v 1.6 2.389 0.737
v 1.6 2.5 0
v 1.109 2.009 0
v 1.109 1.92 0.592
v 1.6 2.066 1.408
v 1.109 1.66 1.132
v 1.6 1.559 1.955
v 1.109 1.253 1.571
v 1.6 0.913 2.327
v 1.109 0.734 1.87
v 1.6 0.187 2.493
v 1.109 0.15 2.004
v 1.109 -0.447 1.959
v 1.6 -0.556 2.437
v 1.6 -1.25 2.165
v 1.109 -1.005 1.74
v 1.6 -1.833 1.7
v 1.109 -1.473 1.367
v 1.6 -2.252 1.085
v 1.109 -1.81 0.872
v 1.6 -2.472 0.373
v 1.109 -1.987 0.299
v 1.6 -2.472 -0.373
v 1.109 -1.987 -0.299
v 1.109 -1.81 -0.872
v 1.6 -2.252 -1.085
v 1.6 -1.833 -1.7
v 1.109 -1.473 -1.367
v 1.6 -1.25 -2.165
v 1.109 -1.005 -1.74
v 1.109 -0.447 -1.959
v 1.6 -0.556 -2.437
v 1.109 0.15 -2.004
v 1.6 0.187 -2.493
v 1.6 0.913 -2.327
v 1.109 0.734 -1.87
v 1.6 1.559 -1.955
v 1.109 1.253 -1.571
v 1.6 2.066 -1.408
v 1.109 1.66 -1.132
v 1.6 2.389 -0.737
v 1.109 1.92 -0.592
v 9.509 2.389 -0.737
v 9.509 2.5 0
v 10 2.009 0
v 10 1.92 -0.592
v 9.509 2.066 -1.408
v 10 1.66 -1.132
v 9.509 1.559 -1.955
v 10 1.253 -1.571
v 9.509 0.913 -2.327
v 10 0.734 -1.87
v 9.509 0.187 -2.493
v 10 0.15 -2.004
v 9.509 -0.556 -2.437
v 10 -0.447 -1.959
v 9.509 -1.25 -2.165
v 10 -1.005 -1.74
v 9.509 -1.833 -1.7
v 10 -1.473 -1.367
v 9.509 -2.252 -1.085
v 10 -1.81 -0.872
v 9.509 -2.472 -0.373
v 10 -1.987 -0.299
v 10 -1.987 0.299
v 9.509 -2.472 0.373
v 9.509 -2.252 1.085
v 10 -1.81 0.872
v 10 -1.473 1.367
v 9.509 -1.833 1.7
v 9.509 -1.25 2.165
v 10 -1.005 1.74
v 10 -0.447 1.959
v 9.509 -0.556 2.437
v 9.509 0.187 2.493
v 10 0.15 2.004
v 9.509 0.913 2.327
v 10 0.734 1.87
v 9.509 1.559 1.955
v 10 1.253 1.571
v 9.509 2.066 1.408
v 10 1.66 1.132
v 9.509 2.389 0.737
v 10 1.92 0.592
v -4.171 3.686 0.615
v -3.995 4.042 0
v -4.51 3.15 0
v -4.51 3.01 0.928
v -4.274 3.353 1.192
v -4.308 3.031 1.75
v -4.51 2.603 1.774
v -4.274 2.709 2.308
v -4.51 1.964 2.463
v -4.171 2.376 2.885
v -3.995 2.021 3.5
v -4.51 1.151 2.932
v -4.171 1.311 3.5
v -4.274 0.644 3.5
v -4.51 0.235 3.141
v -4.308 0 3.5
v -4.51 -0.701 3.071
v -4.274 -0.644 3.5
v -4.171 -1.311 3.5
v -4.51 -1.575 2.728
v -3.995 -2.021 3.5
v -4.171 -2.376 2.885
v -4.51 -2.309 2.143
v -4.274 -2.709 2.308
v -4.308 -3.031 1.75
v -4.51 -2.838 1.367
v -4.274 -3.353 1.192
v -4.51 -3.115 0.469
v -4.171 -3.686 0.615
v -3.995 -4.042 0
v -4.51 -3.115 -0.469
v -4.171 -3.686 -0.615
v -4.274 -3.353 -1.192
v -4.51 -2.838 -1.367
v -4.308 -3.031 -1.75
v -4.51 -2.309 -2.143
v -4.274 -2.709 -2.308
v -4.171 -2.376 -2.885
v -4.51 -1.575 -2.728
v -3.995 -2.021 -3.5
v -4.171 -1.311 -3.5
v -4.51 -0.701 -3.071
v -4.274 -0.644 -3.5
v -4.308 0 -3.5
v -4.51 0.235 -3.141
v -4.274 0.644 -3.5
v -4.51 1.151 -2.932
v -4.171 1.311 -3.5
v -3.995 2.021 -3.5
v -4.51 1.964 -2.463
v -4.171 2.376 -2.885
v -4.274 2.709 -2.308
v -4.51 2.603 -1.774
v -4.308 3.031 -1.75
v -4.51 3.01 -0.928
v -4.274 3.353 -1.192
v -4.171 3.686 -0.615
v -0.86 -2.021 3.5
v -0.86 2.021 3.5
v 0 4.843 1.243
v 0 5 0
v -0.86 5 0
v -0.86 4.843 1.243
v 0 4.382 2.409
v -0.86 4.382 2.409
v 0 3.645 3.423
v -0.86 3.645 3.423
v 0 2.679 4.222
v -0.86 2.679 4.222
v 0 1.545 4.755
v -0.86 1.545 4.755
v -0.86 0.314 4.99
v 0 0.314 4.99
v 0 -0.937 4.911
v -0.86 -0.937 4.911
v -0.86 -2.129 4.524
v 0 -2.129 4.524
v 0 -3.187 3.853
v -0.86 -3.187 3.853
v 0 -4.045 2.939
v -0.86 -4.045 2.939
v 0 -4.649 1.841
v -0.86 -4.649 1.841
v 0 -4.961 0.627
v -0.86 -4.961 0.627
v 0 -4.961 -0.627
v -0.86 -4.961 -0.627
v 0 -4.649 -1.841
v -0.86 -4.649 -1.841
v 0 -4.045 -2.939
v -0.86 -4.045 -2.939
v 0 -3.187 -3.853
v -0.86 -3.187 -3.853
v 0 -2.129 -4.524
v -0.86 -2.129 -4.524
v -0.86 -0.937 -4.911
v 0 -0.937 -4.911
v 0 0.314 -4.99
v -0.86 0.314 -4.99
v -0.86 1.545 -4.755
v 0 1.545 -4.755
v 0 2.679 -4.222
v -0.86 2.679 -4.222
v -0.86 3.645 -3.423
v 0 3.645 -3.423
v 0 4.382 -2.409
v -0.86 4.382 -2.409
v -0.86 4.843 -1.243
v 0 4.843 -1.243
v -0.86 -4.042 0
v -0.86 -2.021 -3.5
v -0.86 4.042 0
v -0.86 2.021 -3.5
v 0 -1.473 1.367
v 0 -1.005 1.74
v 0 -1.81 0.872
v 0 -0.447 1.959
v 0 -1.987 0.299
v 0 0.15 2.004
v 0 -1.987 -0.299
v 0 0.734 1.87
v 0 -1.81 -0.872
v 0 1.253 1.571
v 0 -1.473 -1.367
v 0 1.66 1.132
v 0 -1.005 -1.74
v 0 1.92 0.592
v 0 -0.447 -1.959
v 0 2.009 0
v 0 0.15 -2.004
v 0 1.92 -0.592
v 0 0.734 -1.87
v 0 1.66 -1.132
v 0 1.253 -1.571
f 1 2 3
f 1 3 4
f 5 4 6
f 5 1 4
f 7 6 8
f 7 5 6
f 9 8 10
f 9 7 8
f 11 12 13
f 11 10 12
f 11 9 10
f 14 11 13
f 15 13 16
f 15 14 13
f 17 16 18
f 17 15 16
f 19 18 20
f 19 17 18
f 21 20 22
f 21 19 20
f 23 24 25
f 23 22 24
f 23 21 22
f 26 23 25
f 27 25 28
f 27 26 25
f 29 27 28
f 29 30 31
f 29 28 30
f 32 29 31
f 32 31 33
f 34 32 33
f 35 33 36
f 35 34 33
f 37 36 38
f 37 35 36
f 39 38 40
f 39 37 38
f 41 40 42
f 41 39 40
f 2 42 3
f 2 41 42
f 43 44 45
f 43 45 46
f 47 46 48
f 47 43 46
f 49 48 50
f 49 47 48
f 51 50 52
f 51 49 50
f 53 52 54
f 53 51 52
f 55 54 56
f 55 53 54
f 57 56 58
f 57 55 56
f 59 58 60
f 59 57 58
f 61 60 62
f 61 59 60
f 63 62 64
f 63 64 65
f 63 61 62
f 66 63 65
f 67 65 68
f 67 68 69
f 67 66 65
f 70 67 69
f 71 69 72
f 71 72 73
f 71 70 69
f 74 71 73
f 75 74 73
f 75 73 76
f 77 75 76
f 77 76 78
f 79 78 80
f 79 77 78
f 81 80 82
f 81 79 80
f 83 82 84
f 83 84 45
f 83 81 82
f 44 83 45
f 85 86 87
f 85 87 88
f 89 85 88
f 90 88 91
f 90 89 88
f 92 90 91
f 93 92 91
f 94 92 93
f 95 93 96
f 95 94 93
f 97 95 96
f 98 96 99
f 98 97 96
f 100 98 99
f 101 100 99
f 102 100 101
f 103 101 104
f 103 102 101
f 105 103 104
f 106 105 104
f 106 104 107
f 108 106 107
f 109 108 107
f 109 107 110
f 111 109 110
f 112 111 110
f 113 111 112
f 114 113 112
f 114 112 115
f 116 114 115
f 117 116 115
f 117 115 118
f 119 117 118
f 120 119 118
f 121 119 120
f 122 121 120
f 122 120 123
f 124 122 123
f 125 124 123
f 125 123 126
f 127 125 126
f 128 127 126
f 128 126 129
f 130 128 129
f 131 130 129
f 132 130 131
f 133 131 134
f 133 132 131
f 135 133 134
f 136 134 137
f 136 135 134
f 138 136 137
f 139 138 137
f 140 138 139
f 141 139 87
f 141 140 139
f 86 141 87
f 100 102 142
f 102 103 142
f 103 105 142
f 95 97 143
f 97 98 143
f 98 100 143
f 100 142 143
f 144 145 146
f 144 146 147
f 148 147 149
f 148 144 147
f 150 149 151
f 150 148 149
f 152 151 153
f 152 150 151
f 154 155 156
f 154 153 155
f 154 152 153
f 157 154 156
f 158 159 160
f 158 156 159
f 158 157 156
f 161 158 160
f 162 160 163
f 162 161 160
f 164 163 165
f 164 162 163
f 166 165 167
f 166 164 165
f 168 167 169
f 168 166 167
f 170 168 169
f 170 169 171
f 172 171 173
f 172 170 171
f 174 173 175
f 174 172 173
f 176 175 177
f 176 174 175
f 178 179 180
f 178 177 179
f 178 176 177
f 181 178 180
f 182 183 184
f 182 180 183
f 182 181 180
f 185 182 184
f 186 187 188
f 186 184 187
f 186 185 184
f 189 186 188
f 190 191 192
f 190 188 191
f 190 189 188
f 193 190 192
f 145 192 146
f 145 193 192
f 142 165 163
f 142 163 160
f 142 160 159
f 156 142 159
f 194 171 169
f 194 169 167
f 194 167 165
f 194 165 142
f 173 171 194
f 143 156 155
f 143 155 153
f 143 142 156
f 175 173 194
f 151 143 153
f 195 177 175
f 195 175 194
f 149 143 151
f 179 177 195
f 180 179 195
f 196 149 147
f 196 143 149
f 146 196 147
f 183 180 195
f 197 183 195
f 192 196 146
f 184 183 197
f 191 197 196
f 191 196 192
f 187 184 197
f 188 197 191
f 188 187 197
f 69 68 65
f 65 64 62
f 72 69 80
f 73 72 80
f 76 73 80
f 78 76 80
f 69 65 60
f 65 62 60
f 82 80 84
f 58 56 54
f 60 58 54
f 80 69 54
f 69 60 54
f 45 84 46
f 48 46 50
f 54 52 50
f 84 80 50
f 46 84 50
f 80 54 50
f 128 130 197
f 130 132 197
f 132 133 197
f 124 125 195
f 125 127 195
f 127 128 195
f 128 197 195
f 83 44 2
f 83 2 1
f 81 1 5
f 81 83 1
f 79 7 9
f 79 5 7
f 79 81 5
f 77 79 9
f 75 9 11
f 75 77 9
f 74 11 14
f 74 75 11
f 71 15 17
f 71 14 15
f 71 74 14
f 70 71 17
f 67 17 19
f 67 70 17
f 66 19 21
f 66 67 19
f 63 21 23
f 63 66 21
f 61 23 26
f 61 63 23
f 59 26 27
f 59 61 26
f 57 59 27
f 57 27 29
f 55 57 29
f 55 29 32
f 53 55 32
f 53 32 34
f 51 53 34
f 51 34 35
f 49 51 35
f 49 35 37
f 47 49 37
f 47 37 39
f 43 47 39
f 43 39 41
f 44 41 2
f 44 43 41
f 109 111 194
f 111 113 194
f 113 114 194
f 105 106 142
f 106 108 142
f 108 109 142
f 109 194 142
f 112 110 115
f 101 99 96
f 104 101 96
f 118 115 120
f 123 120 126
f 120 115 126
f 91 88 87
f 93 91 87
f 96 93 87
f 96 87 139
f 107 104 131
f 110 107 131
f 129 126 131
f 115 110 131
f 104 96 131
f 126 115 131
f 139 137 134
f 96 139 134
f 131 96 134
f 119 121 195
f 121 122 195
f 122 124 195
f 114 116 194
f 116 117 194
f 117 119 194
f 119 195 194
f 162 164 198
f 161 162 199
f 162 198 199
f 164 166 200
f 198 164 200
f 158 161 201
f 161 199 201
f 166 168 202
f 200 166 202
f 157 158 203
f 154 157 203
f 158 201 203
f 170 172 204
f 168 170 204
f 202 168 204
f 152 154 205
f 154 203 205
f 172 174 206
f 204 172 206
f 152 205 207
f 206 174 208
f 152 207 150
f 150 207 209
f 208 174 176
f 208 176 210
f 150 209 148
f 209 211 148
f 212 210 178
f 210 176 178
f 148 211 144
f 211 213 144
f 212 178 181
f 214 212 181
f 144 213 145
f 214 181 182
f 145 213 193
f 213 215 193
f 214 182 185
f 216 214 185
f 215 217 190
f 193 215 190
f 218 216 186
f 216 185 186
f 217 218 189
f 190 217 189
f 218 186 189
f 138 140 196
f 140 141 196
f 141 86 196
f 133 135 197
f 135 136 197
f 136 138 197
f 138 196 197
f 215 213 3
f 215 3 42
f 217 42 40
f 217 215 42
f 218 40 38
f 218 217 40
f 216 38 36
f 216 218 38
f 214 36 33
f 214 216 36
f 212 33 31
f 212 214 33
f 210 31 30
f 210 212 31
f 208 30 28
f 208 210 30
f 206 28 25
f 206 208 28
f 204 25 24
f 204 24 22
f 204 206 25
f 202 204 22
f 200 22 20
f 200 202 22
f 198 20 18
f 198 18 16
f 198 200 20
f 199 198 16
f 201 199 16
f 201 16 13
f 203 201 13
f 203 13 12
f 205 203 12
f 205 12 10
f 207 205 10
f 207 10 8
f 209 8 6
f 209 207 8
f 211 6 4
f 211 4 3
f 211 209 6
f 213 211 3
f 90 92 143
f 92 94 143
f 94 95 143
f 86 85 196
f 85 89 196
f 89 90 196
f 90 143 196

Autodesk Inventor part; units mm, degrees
ref_plane "YZ Plane" through (0, 0, 0) normal (1, 0, 0) x (0, 1, 0)
ref_plane "XZ Plane" through (0, 0, 0) normal (0, 1, 0) x (-1, 0, 0)
sketch "Sketch1" plane through (0, 0, 0) normal (0, 0, 1) x (1, 0, 0)
  line L0 (0, 5) -> (0, 2.0092)
  line L1 (1.6, 2.5) -> (10, 2.5)
  line L2 (10, 2.5) -> (10, 0)
  line L3 (10, 0) -> (-0.86, 0)
  line L4 (0, -1) -> (0, 6) projected
  line L5 (-3.032, 0) -> (12.172, 0) projected
  line L6 (-0.86, 0) -> (-0.86, 5)
  line L7 (-0.86, 5) -> (0, 5)
  line L8 (1.6, 2.5) -> (1.1092, 2.0092)
  line L9 (1.1092, 2.0092) -> (0, 2.0092)
  dimension "d0" = 10
  dimension "d1" = 8.4
  dimension "d2" = 5
  dimension "d8" = 0.86
  dimension "d9" = 10
  dimension "d15" = 4.0185
  dimension "d16" = 0.4908
revolve "Body" add sketch "Sketch1" angle 360 about axis through (10, 0, 0) along (-1, 0, 0)
sketch "Sketch2" plane through (0, 0, 0) normal (1, 0, 0) x (0, 0, -1)
  circle A0 centre (0, 0) radius 5 projected
  line L0 (0, 4.0415) -> (3.5, 2.0207)
  line L1 (3.5, 2.0207) -> (3.5, -2.0207)
  line L2 (3.5, -2.0207) -> (0, -4.0415)
  line L3 (0, -4.0415) -> (-3.5, -2.0207)
  line L4 (-3.5, -2.0207) -> (-3.5, 2.0207)
  line L5 (-3.5, 2.0207) -> (0, 4.0415)
  circle A1 centre (0, 0) radius 5 projected
  dimension "d10" = 7
extrude "Head" add sketch "Sketch2" against normal blind 4.51 contours L0 L1 L2 L3 L4 L5
sketch "Sketch3" plane through (0, 0, 0) normal (0, 0, 1) x (1, 0, 0)
  line L0 (-4.51, 3.15) -> (-4.51, 4.0415)
  line L1 (-4.51, 4.0415) -> (-3.9953, 4.0415)
  line L2 (-3.9953, 4.0415) -> (-4.51, 3.15)
  line L3 (-2.0945, 4.0415) -> (-4.51, 4.0415)
  line L4 (-4.51, 4.0415) -> (-4.51, 1.7321)
  line L5 (-0.86, 4.0415) -> (-4.51, 4.0415) projected
  line L6 (-4.51, 4.0415) -> (-4.51, 2.0207) projected
  line L7 (-5.24, 0) -> (-0.13, 0) projected
  dimension "d5" = 30
  dimension "d18" = 6.3
revolve "Chamfer1" cut sketch "Sketch3" angle 360 about axis through (-10, 0, 0) along (1, 0, 0)
thread "Thread" size "M5x0.8" class "6g" standard "ISO Metric profile" length 8.4
chamfer "Chamfer2" distance 0.4908 distance2 0.4908 1 edges at (10, -2.5, 0) measured on face at (10, -0.7379, 0.3873)
ref_plane "Work Plane1" through (3.5, 0, 0) normal (0, 0, 1) x (1, 0, 0)
equation "\"d10\" = SW"
equation "\"d3\" = KOH"
equation "\"d13\" = GEL"
equation "\"d6\" = -0.5 * SPD + 0.5 * GD"
equation "\"d7\" = -0.5 * SPD + 0.5 * GD"
equation "\"d0\" = NLG"
equation "\"d1\" = GEL"
equation "\"d2\" = GD"
equation "\"d8\" = PHH"
equation "\"d9\" = LADI"
equation "\"d15\" = BDM"
equation "\"d16\" = GAL"
equation "\"d5\" = ANG1"
equation "\"d18\" = SW0"
equation "\"NLG\" = 10"
equation "\"GD\" = NND"
equation "\"BDM\" = NND - 1.2269 * PTC"
equation "\"KOH\" = 4.51"
equation "\"GEL\" = 8.4"
equation "\"LADI\" = 10"
equation "\"SW\" = 7"
equation "\"PHH\" = 0.86"
equation "\"SW0\" = 6.3"
equation "\"SPD\" = NND - 1.2269 * PTC"
equation "\"ANG1\" = 30deg"
equation "\"GAL\" = 0.61345 * PTC"
equation "\"GUL\" = 0.61345 * PTC"
equation "\"WFT\" = PHH"
equation "\"PTC\" = 0.8"
equation "\"THREADDIA\" = 5"
equation "\"E0\" = 1.155 * SW"
equation "\"TOA\" = 30deg"
equation "\"NND\" = 5"
equation "\"GD1\" = THREADDIA - 1.2269 * PTC"
equation "\"SDH\" = 5.7"
equation "\"KOH1\" = 3.65"
equation "\"SD2\" = NND"
equation "\"SD\" = 0"
equation "\"RR\" = 0.2"
properties part number "AS 1427 - M5 x 10" material "Steel, Mild"
